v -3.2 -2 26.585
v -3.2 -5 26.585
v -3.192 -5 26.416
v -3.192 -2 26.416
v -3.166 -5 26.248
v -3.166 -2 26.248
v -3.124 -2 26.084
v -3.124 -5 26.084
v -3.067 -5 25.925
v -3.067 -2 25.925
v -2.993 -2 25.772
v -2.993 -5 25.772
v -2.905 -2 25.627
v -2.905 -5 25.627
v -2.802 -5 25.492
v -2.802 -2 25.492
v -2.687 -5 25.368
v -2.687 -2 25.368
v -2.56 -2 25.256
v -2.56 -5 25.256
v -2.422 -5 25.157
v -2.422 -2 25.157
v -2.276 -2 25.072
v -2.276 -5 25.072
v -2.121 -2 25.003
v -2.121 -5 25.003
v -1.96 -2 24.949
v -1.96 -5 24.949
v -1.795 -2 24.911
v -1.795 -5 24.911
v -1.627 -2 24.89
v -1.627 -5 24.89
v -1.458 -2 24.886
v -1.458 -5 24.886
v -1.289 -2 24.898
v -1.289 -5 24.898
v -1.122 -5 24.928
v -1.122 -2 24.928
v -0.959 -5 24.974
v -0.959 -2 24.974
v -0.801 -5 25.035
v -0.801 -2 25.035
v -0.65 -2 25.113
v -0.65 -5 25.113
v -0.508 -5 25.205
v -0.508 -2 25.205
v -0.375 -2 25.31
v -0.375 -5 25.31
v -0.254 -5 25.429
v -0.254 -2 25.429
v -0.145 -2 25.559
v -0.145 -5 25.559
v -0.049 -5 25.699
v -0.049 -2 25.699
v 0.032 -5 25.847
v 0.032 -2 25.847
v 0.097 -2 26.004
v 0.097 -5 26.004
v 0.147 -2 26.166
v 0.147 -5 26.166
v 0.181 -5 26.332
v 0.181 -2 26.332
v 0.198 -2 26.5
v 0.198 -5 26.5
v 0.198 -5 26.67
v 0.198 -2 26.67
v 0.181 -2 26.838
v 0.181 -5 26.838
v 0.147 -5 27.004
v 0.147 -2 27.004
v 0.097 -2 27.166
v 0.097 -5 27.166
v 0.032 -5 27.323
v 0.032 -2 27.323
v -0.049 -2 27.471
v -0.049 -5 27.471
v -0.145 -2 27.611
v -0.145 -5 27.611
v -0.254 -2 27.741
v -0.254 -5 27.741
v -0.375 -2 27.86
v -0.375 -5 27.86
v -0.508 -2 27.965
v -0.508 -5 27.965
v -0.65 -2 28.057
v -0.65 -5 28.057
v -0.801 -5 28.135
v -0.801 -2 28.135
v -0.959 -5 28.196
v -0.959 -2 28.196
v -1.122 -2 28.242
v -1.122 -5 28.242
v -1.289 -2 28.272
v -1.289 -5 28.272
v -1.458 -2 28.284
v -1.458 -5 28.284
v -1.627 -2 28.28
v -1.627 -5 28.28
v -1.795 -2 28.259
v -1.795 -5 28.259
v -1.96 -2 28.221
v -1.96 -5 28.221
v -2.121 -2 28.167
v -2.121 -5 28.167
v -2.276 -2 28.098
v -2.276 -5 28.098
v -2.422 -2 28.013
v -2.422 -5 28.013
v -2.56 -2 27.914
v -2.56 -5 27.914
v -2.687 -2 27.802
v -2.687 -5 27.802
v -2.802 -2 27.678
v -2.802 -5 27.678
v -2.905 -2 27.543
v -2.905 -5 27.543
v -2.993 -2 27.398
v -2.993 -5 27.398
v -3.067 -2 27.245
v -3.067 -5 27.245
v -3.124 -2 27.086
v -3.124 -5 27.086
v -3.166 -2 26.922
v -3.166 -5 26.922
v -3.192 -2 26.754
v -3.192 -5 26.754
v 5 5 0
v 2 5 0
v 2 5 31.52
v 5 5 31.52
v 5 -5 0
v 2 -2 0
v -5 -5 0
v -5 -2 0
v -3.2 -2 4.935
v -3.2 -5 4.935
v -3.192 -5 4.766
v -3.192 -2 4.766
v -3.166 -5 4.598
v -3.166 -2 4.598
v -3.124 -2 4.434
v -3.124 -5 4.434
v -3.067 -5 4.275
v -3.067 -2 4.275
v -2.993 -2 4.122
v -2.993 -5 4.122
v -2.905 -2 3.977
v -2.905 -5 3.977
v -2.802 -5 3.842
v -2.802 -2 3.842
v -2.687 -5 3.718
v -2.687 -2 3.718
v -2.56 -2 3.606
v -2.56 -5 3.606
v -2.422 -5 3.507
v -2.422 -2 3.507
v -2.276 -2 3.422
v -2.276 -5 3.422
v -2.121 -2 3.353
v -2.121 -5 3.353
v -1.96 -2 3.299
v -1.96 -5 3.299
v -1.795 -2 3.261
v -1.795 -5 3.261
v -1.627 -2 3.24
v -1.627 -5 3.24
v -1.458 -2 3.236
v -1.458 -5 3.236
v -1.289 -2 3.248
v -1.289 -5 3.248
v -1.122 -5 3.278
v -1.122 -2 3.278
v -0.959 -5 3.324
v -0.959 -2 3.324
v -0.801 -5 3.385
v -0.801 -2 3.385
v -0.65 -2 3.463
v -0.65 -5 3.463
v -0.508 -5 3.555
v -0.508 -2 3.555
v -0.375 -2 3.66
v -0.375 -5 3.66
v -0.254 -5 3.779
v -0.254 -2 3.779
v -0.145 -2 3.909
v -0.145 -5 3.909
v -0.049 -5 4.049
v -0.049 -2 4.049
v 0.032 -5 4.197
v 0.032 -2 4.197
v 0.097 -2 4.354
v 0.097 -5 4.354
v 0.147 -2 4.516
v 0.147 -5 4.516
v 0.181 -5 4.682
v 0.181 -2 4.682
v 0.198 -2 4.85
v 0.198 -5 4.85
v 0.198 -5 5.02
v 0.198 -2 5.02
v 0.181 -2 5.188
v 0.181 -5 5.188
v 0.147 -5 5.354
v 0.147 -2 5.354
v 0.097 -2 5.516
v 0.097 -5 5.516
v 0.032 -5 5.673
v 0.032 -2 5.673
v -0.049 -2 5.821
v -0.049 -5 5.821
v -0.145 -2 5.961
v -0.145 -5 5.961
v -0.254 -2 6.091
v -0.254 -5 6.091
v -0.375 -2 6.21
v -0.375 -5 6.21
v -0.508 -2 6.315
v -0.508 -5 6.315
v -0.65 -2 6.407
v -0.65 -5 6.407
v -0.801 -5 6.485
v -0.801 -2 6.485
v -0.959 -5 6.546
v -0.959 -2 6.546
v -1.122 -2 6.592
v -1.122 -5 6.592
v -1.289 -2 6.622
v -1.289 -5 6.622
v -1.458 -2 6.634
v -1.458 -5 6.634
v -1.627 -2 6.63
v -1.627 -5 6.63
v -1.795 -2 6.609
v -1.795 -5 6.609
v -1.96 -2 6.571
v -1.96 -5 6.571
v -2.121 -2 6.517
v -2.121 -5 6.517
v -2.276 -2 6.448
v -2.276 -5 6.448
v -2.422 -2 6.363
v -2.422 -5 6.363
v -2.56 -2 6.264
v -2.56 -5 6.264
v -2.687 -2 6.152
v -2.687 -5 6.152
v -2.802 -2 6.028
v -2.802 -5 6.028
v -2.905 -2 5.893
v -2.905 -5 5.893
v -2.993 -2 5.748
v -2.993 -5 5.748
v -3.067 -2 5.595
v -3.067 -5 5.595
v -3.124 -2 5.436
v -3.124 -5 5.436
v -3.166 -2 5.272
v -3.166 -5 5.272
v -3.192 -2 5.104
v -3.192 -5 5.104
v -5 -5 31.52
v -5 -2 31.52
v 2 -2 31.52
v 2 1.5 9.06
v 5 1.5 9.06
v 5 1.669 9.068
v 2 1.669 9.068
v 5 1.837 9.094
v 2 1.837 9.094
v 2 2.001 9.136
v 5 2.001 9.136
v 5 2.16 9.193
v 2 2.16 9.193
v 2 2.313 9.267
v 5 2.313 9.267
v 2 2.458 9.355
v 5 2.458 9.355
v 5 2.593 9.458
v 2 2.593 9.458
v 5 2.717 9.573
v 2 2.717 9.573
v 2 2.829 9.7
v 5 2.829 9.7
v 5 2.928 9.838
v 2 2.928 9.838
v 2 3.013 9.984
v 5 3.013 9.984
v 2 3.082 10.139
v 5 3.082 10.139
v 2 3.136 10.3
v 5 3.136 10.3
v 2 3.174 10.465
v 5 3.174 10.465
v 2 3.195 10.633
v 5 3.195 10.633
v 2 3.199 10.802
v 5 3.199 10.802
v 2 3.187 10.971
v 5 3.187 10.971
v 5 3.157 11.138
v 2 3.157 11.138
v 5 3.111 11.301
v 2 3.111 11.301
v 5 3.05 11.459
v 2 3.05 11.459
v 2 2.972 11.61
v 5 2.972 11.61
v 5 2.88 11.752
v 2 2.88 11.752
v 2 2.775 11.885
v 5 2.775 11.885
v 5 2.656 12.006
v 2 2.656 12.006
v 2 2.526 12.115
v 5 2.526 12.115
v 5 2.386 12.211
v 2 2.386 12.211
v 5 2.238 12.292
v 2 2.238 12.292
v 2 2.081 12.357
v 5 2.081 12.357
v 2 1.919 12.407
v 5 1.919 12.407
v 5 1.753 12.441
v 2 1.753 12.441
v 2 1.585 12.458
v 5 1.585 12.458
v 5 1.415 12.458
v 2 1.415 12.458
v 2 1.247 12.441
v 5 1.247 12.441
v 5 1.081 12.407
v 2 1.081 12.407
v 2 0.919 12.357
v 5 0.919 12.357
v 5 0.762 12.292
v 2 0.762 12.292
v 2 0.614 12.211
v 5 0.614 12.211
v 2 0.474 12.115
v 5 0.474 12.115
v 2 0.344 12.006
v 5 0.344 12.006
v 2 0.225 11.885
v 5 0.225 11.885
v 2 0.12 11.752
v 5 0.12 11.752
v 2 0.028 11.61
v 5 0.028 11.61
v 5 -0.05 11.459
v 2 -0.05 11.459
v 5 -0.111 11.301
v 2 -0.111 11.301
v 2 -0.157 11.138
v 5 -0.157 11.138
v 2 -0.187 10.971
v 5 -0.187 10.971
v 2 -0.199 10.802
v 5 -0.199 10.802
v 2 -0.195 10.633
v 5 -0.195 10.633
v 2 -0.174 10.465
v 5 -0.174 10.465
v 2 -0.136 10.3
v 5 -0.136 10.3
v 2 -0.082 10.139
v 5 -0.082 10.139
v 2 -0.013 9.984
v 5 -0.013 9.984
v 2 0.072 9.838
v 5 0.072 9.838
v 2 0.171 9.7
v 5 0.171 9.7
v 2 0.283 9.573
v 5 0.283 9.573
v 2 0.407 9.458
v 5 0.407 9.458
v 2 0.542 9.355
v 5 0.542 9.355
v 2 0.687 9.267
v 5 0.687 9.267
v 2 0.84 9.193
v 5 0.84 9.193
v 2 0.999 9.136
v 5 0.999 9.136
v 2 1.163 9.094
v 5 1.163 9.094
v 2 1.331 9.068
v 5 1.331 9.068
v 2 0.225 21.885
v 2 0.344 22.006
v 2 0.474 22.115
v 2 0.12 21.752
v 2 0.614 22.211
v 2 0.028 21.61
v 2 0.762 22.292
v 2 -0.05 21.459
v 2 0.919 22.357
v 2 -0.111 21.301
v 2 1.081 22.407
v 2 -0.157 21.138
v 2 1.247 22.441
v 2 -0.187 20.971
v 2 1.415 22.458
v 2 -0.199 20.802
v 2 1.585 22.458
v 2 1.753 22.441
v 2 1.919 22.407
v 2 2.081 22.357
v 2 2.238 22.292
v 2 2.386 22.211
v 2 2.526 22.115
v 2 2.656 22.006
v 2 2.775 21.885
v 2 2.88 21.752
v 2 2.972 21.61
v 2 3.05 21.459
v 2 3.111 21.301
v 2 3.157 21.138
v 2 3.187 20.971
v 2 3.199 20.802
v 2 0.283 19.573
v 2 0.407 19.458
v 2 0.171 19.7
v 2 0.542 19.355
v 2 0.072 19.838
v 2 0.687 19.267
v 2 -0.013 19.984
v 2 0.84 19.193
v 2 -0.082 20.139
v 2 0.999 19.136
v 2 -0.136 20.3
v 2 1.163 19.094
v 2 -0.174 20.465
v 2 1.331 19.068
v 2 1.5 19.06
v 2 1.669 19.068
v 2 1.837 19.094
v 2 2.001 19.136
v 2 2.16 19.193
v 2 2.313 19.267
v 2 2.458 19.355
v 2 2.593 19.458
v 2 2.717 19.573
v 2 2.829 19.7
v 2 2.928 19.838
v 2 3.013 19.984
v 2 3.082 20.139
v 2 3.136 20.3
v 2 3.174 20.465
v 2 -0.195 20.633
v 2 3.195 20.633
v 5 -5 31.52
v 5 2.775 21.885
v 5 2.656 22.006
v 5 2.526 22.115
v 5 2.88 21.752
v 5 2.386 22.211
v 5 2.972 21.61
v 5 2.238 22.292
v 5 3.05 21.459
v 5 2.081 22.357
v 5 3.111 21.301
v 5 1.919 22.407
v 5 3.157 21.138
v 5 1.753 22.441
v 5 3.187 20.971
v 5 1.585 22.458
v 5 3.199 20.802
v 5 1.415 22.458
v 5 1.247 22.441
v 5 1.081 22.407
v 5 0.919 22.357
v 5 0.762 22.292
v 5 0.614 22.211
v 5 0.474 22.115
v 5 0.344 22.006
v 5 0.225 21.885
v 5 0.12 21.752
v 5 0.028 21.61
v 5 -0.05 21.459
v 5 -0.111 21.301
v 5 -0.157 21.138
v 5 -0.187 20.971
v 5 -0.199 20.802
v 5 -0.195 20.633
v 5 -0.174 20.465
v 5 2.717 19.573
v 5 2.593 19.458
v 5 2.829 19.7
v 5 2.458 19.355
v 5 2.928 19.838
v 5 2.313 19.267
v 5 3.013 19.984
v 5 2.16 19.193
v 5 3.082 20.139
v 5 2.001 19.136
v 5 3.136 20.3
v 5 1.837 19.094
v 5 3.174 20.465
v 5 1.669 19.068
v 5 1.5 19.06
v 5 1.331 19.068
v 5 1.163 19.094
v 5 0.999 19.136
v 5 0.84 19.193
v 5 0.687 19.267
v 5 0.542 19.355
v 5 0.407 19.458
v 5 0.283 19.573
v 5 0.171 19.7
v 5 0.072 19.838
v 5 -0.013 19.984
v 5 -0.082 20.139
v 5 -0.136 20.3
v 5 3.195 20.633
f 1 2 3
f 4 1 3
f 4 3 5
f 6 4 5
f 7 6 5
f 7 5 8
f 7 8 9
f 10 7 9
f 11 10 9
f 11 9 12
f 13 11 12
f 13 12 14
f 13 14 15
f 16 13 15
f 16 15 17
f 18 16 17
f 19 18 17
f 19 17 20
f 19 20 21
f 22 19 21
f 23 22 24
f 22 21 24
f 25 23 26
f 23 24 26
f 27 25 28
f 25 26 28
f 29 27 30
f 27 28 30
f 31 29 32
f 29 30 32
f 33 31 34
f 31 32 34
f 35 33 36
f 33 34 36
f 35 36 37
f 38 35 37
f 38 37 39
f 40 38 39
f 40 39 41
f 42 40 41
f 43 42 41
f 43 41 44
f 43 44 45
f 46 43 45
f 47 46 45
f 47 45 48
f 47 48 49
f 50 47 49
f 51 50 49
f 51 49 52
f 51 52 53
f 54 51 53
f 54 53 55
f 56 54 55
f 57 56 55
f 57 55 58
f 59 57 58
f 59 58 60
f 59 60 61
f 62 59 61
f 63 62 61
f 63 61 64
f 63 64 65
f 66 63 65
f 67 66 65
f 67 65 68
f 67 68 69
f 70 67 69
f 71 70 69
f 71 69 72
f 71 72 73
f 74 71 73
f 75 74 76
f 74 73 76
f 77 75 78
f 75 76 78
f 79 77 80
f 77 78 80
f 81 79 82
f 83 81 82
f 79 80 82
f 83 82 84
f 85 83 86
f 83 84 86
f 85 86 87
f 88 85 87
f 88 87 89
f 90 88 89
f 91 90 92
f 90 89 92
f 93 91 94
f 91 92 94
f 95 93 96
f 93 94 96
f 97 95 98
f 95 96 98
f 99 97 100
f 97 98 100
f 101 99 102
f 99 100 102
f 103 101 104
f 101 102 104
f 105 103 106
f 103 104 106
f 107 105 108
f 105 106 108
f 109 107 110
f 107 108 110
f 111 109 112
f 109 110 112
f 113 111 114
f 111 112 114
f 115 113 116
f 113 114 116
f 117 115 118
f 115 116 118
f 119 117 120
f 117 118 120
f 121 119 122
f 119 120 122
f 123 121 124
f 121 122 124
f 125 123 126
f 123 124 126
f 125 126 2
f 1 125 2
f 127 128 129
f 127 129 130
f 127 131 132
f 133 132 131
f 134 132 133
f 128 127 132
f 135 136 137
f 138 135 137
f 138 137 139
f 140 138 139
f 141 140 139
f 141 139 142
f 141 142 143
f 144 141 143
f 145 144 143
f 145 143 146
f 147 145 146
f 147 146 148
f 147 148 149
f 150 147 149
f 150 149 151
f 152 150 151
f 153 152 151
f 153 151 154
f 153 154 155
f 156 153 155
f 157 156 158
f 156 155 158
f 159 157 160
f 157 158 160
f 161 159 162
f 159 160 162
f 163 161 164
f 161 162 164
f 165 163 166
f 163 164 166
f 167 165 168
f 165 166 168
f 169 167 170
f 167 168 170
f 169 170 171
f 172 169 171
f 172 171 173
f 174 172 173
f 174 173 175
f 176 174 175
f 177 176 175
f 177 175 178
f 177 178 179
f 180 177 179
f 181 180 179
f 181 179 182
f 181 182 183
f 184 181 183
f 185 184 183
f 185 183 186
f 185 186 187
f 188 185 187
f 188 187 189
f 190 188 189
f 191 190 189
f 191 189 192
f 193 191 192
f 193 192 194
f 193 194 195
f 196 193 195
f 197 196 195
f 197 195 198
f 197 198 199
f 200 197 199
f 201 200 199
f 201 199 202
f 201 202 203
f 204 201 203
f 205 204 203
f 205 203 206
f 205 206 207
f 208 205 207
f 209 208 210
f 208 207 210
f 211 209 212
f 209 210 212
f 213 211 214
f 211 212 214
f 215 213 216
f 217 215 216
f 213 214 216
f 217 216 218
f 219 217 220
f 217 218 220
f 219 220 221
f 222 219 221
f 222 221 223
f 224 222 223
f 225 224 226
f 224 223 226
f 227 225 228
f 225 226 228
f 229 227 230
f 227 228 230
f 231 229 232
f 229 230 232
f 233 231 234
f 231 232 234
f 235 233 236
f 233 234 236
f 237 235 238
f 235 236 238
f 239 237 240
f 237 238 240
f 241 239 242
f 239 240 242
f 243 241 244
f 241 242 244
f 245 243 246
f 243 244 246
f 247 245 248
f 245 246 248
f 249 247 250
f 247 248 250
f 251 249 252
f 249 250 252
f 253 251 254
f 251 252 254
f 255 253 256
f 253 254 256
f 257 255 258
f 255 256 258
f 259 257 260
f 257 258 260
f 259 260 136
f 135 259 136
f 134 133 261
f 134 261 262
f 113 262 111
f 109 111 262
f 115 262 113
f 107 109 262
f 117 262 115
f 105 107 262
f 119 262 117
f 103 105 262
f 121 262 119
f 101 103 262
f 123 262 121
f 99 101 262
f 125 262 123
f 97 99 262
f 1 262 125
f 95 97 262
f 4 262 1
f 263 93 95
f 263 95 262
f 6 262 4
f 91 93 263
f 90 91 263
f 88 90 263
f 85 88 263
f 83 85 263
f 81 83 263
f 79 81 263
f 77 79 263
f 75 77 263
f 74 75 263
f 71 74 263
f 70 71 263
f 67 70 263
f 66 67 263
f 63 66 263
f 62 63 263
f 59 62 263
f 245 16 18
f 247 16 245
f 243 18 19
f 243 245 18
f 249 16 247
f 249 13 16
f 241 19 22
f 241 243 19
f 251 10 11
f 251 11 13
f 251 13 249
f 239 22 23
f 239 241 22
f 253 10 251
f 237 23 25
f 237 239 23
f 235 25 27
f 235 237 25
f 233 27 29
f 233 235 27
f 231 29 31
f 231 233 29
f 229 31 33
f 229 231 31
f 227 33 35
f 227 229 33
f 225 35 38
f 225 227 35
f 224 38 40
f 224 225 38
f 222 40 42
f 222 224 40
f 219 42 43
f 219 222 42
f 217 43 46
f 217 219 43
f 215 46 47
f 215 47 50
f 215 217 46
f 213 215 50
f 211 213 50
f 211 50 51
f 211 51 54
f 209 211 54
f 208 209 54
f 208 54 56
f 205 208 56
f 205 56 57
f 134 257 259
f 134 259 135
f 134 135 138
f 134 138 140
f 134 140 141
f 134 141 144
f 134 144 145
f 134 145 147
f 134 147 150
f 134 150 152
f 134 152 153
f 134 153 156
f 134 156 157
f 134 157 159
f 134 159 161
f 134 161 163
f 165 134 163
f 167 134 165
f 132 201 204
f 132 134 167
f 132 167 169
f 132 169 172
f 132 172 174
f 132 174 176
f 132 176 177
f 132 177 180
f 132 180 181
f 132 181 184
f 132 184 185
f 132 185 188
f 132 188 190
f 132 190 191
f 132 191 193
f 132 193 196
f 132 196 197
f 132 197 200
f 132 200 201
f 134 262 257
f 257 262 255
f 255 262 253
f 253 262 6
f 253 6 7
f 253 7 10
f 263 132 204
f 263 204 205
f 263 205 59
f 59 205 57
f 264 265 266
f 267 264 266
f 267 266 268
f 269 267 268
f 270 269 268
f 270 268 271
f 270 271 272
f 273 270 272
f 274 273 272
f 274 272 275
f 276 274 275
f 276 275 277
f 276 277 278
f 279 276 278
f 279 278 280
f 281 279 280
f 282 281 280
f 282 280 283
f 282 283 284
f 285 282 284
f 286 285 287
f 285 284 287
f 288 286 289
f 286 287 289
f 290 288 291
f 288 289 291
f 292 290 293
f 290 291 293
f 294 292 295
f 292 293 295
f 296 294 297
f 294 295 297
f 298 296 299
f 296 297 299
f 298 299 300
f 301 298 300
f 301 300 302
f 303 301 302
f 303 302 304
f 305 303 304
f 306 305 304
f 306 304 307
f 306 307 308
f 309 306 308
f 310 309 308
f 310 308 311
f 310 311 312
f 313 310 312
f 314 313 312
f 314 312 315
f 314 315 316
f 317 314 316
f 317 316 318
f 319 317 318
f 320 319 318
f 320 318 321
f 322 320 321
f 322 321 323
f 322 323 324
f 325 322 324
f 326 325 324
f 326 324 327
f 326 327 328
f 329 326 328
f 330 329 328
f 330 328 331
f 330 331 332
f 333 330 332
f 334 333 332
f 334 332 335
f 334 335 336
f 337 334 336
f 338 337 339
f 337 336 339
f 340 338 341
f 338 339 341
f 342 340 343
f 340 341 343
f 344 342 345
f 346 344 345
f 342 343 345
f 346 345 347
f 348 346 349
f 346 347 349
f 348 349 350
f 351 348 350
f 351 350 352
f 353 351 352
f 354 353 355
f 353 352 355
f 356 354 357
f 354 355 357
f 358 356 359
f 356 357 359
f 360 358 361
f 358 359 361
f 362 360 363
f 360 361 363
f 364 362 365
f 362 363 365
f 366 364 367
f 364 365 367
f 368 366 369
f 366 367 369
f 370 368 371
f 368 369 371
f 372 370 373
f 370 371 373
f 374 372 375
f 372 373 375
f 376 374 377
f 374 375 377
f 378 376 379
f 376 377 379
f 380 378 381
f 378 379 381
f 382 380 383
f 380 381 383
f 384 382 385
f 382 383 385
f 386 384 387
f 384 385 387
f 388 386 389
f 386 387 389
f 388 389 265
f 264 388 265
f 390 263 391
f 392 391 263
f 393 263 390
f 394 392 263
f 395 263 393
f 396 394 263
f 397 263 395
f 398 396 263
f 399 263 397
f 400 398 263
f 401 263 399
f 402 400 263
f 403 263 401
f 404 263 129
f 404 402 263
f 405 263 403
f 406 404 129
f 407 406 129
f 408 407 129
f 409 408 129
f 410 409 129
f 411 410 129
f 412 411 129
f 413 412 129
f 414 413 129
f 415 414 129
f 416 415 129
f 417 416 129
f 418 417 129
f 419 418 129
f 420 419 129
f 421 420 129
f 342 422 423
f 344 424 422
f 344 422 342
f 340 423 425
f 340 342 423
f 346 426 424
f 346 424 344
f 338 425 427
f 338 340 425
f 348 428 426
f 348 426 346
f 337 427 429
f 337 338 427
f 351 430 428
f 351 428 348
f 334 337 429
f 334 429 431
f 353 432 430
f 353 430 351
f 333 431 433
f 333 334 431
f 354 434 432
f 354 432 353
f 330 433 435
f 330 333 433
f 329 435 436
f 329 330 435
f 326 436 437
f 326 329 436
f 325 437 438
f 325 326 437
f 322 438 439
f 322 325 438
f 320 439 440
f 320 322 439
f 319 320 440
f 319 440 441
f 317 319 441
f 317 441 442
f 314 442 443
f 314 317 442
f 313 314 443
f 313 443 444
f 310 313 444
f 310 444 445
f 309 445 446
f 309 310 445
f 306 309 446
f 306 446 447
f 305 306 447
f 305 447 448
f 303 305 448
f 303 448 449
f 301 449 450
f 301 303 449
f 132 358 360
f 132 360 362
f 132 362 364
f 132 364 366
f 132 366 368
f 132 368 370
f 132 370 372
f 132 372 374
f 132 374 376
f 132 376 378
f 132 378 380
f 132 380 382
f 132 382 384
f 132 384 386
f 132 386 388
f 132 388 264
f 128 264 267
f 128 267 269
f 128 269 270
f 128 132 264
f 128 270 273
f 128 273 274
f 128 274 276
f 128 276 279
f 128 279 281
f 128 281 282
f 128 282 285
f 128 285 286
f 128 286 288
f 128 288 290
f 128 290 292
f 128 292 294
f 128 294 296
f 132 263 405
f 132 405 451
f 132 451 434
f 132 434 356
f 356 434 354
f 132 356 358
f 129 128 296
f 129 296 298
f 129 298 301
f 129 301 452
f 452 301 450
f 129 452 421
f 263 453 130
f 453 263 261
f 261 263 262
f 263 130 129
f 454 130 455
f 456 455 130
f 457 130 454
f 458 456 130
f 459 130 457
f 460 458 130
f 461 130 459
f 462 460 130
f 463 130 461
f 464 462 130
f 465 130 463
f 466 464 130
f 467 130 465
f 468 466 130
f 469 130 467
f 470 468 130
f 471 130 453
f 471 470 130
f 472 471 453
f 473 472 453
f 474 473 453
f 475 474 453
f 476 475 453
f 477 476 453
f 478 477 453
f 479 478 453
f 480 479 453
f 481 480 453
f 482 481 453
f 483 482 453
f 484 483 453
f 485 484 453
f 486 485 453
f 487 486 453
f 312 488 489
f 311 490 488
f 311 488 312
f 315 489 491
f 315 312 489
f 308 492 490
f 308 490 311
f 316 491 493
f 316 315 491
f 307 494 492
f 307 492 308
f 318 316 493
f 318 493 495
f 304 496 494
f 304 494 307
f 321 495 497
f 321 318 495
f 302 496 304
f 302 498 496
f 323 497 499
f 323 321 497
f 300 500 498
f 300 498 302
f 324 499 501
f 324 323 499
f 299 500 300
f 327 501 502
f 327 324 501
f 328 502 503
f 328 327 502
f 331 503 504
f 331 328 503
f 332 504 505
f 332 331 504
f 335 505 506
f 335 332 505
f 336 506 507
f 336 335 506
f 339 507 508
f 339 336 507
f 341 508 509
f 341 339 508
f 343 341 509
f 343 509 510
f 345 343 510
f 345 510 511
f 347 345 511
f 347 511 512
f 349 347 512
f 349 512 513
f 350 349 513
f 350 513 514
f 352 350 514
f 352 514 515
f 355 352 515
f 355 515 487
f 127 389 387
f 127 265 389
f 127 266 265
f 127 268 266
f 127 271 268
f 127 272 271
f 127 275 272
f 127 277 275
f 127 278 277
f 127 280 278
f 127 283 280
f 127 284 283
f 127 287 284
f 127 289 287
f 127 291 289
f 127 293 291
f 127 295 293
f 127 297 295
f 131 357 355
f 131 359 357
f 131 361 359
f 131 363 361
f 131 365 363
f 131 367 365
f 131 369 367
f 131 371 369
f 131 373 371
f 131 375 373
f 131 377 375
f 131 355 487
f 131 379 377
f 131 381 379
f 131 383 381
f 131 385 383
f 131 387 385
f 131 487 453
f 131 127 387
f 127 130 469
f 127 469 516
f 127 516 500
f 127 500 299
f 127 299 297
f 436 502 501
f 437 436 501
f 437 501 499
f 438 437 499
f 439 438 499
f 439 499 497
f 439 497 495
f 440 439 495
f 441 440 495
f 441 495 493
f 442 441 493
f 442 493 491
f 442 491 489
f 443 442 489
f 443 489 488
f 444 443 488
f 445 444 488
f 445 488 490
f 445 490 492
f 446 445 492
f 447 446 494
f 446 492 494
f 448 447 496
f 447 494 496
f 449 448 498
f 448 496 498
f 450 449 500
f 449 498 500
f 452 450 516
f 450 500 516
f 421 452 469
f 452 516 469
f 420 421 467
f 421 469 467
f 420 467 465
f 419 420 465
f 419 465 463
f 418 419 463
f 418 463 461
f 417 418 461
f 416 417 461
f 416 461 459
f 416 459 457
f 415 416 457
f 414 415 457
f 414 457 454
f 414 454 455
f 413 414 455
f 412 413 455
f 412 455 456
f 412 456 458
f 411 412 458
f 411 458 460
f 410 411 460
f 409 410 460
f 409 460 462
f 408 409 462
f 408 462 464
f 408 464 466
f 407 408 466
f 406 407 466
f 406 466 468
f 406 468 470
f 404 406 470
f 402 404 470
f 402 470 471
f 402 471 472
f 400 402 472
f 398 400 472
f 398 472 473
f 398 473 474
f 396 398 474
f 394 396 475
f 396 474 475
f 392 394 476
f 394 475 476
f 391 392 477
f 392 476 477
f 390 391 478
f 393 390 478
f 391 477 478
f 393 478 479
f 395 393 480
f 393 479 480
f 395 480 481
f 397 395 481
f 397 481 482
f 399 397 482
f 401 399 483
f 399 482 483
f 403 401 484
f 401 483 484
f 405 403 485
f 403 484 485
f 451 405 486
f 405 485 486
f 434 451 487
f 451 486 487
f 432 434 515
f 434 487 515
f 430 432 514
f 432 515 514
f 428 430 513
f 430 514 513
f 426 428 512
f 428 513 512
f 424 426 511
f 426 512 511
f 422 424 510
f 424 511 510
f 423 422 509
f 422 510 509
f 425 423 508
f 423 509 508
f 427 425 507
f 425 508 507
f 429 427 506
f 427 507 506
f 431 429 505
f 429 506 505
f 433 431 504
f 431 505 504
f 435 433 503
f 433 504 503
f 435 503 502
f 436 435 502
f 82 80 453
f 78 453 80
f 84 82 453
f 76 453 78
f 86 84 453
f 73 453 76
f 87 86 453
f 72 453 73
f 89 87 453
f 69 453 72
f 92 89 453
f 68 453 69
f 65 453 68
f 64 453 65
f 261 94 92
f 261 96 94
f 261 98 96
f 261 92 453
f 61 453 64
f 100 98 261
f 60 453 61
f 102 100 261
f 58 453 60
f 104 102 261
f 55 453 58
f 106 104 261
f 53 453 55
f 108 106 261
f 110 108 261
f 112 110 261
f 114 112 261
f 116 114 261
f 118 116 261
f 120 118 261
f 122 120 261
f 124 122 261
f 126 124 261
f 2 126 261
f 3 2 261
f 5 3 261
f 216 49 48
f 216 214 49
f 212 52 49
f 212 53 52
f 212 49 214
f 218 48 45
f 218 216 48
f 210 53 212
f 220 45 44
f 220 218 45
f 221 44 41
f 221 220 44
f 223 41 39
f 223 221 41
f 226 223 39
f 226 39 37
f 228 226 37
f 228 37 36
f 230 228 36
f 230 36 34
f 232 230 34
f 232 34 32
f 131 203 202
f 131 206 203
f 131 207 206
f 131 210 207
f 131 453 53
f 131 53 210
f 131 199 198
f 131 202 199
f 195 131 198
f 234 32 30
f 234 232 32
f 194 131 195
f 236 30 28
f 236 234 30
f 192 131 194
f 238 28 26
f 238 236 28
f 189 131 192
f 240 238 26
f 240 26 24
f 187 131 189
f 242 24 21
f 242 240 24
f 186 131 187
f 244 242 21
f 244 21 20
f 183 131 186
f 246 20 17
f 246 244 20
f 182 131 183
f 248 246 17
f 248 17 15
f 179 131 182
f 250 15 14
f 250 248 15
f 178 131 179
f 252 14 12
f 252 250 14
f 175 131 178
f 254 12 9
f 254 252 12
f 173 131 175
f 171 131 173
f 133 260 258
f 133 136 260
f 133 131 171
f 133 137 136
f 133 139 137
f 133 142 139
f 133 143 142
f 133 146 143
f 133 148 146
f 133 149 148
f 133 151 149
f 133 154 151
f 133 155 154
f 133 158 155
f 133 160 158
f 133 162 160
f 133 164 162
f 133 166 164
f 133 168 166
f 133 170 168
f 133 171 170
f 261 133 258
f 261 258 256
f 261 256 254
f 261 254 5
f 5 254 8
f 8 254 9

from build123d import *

# Parameters (mm, degrees)
EXTRUDE_1_DEPTH    = 31.52
HOLE_WIZARD_M3_1_D = 3.4
HOLE_WIZARD_M3_2_D = 3.4


with BuildPart() as part:
    # ｽｹｯﾁ1 → ﾎﾞｽ - 押し出し1 (new body)
    with BuildSketch(Plane.XY):
        Polygon((-5, -2), (2, -2), (2, 5), (5, 5), (5, -5), (-5, -5), align=None)
    extrude(amount=EXTRUDE_1_DEPTH)

    # M3 すきま穴1 (through all)
    with Locations(Plane(origin=(0, -2, 0), x_dir=(1, 0, 0), z_dir=(0, 1, 0))):
        with Locations((-1.5, -4.935), (-1.5, -26.585)):
            Hole(HOLE_WIZARD_M3_1_D / 2)

    # M3 すきま穴2 (through all)
    with Locations(Plane.ZY.offset(-2)):
        with Locations((10.76, 1.5), (20.76, 1.5)):
            Hole(HOLE_WIZARD_M3_2_D / 2)


solid = part.part
